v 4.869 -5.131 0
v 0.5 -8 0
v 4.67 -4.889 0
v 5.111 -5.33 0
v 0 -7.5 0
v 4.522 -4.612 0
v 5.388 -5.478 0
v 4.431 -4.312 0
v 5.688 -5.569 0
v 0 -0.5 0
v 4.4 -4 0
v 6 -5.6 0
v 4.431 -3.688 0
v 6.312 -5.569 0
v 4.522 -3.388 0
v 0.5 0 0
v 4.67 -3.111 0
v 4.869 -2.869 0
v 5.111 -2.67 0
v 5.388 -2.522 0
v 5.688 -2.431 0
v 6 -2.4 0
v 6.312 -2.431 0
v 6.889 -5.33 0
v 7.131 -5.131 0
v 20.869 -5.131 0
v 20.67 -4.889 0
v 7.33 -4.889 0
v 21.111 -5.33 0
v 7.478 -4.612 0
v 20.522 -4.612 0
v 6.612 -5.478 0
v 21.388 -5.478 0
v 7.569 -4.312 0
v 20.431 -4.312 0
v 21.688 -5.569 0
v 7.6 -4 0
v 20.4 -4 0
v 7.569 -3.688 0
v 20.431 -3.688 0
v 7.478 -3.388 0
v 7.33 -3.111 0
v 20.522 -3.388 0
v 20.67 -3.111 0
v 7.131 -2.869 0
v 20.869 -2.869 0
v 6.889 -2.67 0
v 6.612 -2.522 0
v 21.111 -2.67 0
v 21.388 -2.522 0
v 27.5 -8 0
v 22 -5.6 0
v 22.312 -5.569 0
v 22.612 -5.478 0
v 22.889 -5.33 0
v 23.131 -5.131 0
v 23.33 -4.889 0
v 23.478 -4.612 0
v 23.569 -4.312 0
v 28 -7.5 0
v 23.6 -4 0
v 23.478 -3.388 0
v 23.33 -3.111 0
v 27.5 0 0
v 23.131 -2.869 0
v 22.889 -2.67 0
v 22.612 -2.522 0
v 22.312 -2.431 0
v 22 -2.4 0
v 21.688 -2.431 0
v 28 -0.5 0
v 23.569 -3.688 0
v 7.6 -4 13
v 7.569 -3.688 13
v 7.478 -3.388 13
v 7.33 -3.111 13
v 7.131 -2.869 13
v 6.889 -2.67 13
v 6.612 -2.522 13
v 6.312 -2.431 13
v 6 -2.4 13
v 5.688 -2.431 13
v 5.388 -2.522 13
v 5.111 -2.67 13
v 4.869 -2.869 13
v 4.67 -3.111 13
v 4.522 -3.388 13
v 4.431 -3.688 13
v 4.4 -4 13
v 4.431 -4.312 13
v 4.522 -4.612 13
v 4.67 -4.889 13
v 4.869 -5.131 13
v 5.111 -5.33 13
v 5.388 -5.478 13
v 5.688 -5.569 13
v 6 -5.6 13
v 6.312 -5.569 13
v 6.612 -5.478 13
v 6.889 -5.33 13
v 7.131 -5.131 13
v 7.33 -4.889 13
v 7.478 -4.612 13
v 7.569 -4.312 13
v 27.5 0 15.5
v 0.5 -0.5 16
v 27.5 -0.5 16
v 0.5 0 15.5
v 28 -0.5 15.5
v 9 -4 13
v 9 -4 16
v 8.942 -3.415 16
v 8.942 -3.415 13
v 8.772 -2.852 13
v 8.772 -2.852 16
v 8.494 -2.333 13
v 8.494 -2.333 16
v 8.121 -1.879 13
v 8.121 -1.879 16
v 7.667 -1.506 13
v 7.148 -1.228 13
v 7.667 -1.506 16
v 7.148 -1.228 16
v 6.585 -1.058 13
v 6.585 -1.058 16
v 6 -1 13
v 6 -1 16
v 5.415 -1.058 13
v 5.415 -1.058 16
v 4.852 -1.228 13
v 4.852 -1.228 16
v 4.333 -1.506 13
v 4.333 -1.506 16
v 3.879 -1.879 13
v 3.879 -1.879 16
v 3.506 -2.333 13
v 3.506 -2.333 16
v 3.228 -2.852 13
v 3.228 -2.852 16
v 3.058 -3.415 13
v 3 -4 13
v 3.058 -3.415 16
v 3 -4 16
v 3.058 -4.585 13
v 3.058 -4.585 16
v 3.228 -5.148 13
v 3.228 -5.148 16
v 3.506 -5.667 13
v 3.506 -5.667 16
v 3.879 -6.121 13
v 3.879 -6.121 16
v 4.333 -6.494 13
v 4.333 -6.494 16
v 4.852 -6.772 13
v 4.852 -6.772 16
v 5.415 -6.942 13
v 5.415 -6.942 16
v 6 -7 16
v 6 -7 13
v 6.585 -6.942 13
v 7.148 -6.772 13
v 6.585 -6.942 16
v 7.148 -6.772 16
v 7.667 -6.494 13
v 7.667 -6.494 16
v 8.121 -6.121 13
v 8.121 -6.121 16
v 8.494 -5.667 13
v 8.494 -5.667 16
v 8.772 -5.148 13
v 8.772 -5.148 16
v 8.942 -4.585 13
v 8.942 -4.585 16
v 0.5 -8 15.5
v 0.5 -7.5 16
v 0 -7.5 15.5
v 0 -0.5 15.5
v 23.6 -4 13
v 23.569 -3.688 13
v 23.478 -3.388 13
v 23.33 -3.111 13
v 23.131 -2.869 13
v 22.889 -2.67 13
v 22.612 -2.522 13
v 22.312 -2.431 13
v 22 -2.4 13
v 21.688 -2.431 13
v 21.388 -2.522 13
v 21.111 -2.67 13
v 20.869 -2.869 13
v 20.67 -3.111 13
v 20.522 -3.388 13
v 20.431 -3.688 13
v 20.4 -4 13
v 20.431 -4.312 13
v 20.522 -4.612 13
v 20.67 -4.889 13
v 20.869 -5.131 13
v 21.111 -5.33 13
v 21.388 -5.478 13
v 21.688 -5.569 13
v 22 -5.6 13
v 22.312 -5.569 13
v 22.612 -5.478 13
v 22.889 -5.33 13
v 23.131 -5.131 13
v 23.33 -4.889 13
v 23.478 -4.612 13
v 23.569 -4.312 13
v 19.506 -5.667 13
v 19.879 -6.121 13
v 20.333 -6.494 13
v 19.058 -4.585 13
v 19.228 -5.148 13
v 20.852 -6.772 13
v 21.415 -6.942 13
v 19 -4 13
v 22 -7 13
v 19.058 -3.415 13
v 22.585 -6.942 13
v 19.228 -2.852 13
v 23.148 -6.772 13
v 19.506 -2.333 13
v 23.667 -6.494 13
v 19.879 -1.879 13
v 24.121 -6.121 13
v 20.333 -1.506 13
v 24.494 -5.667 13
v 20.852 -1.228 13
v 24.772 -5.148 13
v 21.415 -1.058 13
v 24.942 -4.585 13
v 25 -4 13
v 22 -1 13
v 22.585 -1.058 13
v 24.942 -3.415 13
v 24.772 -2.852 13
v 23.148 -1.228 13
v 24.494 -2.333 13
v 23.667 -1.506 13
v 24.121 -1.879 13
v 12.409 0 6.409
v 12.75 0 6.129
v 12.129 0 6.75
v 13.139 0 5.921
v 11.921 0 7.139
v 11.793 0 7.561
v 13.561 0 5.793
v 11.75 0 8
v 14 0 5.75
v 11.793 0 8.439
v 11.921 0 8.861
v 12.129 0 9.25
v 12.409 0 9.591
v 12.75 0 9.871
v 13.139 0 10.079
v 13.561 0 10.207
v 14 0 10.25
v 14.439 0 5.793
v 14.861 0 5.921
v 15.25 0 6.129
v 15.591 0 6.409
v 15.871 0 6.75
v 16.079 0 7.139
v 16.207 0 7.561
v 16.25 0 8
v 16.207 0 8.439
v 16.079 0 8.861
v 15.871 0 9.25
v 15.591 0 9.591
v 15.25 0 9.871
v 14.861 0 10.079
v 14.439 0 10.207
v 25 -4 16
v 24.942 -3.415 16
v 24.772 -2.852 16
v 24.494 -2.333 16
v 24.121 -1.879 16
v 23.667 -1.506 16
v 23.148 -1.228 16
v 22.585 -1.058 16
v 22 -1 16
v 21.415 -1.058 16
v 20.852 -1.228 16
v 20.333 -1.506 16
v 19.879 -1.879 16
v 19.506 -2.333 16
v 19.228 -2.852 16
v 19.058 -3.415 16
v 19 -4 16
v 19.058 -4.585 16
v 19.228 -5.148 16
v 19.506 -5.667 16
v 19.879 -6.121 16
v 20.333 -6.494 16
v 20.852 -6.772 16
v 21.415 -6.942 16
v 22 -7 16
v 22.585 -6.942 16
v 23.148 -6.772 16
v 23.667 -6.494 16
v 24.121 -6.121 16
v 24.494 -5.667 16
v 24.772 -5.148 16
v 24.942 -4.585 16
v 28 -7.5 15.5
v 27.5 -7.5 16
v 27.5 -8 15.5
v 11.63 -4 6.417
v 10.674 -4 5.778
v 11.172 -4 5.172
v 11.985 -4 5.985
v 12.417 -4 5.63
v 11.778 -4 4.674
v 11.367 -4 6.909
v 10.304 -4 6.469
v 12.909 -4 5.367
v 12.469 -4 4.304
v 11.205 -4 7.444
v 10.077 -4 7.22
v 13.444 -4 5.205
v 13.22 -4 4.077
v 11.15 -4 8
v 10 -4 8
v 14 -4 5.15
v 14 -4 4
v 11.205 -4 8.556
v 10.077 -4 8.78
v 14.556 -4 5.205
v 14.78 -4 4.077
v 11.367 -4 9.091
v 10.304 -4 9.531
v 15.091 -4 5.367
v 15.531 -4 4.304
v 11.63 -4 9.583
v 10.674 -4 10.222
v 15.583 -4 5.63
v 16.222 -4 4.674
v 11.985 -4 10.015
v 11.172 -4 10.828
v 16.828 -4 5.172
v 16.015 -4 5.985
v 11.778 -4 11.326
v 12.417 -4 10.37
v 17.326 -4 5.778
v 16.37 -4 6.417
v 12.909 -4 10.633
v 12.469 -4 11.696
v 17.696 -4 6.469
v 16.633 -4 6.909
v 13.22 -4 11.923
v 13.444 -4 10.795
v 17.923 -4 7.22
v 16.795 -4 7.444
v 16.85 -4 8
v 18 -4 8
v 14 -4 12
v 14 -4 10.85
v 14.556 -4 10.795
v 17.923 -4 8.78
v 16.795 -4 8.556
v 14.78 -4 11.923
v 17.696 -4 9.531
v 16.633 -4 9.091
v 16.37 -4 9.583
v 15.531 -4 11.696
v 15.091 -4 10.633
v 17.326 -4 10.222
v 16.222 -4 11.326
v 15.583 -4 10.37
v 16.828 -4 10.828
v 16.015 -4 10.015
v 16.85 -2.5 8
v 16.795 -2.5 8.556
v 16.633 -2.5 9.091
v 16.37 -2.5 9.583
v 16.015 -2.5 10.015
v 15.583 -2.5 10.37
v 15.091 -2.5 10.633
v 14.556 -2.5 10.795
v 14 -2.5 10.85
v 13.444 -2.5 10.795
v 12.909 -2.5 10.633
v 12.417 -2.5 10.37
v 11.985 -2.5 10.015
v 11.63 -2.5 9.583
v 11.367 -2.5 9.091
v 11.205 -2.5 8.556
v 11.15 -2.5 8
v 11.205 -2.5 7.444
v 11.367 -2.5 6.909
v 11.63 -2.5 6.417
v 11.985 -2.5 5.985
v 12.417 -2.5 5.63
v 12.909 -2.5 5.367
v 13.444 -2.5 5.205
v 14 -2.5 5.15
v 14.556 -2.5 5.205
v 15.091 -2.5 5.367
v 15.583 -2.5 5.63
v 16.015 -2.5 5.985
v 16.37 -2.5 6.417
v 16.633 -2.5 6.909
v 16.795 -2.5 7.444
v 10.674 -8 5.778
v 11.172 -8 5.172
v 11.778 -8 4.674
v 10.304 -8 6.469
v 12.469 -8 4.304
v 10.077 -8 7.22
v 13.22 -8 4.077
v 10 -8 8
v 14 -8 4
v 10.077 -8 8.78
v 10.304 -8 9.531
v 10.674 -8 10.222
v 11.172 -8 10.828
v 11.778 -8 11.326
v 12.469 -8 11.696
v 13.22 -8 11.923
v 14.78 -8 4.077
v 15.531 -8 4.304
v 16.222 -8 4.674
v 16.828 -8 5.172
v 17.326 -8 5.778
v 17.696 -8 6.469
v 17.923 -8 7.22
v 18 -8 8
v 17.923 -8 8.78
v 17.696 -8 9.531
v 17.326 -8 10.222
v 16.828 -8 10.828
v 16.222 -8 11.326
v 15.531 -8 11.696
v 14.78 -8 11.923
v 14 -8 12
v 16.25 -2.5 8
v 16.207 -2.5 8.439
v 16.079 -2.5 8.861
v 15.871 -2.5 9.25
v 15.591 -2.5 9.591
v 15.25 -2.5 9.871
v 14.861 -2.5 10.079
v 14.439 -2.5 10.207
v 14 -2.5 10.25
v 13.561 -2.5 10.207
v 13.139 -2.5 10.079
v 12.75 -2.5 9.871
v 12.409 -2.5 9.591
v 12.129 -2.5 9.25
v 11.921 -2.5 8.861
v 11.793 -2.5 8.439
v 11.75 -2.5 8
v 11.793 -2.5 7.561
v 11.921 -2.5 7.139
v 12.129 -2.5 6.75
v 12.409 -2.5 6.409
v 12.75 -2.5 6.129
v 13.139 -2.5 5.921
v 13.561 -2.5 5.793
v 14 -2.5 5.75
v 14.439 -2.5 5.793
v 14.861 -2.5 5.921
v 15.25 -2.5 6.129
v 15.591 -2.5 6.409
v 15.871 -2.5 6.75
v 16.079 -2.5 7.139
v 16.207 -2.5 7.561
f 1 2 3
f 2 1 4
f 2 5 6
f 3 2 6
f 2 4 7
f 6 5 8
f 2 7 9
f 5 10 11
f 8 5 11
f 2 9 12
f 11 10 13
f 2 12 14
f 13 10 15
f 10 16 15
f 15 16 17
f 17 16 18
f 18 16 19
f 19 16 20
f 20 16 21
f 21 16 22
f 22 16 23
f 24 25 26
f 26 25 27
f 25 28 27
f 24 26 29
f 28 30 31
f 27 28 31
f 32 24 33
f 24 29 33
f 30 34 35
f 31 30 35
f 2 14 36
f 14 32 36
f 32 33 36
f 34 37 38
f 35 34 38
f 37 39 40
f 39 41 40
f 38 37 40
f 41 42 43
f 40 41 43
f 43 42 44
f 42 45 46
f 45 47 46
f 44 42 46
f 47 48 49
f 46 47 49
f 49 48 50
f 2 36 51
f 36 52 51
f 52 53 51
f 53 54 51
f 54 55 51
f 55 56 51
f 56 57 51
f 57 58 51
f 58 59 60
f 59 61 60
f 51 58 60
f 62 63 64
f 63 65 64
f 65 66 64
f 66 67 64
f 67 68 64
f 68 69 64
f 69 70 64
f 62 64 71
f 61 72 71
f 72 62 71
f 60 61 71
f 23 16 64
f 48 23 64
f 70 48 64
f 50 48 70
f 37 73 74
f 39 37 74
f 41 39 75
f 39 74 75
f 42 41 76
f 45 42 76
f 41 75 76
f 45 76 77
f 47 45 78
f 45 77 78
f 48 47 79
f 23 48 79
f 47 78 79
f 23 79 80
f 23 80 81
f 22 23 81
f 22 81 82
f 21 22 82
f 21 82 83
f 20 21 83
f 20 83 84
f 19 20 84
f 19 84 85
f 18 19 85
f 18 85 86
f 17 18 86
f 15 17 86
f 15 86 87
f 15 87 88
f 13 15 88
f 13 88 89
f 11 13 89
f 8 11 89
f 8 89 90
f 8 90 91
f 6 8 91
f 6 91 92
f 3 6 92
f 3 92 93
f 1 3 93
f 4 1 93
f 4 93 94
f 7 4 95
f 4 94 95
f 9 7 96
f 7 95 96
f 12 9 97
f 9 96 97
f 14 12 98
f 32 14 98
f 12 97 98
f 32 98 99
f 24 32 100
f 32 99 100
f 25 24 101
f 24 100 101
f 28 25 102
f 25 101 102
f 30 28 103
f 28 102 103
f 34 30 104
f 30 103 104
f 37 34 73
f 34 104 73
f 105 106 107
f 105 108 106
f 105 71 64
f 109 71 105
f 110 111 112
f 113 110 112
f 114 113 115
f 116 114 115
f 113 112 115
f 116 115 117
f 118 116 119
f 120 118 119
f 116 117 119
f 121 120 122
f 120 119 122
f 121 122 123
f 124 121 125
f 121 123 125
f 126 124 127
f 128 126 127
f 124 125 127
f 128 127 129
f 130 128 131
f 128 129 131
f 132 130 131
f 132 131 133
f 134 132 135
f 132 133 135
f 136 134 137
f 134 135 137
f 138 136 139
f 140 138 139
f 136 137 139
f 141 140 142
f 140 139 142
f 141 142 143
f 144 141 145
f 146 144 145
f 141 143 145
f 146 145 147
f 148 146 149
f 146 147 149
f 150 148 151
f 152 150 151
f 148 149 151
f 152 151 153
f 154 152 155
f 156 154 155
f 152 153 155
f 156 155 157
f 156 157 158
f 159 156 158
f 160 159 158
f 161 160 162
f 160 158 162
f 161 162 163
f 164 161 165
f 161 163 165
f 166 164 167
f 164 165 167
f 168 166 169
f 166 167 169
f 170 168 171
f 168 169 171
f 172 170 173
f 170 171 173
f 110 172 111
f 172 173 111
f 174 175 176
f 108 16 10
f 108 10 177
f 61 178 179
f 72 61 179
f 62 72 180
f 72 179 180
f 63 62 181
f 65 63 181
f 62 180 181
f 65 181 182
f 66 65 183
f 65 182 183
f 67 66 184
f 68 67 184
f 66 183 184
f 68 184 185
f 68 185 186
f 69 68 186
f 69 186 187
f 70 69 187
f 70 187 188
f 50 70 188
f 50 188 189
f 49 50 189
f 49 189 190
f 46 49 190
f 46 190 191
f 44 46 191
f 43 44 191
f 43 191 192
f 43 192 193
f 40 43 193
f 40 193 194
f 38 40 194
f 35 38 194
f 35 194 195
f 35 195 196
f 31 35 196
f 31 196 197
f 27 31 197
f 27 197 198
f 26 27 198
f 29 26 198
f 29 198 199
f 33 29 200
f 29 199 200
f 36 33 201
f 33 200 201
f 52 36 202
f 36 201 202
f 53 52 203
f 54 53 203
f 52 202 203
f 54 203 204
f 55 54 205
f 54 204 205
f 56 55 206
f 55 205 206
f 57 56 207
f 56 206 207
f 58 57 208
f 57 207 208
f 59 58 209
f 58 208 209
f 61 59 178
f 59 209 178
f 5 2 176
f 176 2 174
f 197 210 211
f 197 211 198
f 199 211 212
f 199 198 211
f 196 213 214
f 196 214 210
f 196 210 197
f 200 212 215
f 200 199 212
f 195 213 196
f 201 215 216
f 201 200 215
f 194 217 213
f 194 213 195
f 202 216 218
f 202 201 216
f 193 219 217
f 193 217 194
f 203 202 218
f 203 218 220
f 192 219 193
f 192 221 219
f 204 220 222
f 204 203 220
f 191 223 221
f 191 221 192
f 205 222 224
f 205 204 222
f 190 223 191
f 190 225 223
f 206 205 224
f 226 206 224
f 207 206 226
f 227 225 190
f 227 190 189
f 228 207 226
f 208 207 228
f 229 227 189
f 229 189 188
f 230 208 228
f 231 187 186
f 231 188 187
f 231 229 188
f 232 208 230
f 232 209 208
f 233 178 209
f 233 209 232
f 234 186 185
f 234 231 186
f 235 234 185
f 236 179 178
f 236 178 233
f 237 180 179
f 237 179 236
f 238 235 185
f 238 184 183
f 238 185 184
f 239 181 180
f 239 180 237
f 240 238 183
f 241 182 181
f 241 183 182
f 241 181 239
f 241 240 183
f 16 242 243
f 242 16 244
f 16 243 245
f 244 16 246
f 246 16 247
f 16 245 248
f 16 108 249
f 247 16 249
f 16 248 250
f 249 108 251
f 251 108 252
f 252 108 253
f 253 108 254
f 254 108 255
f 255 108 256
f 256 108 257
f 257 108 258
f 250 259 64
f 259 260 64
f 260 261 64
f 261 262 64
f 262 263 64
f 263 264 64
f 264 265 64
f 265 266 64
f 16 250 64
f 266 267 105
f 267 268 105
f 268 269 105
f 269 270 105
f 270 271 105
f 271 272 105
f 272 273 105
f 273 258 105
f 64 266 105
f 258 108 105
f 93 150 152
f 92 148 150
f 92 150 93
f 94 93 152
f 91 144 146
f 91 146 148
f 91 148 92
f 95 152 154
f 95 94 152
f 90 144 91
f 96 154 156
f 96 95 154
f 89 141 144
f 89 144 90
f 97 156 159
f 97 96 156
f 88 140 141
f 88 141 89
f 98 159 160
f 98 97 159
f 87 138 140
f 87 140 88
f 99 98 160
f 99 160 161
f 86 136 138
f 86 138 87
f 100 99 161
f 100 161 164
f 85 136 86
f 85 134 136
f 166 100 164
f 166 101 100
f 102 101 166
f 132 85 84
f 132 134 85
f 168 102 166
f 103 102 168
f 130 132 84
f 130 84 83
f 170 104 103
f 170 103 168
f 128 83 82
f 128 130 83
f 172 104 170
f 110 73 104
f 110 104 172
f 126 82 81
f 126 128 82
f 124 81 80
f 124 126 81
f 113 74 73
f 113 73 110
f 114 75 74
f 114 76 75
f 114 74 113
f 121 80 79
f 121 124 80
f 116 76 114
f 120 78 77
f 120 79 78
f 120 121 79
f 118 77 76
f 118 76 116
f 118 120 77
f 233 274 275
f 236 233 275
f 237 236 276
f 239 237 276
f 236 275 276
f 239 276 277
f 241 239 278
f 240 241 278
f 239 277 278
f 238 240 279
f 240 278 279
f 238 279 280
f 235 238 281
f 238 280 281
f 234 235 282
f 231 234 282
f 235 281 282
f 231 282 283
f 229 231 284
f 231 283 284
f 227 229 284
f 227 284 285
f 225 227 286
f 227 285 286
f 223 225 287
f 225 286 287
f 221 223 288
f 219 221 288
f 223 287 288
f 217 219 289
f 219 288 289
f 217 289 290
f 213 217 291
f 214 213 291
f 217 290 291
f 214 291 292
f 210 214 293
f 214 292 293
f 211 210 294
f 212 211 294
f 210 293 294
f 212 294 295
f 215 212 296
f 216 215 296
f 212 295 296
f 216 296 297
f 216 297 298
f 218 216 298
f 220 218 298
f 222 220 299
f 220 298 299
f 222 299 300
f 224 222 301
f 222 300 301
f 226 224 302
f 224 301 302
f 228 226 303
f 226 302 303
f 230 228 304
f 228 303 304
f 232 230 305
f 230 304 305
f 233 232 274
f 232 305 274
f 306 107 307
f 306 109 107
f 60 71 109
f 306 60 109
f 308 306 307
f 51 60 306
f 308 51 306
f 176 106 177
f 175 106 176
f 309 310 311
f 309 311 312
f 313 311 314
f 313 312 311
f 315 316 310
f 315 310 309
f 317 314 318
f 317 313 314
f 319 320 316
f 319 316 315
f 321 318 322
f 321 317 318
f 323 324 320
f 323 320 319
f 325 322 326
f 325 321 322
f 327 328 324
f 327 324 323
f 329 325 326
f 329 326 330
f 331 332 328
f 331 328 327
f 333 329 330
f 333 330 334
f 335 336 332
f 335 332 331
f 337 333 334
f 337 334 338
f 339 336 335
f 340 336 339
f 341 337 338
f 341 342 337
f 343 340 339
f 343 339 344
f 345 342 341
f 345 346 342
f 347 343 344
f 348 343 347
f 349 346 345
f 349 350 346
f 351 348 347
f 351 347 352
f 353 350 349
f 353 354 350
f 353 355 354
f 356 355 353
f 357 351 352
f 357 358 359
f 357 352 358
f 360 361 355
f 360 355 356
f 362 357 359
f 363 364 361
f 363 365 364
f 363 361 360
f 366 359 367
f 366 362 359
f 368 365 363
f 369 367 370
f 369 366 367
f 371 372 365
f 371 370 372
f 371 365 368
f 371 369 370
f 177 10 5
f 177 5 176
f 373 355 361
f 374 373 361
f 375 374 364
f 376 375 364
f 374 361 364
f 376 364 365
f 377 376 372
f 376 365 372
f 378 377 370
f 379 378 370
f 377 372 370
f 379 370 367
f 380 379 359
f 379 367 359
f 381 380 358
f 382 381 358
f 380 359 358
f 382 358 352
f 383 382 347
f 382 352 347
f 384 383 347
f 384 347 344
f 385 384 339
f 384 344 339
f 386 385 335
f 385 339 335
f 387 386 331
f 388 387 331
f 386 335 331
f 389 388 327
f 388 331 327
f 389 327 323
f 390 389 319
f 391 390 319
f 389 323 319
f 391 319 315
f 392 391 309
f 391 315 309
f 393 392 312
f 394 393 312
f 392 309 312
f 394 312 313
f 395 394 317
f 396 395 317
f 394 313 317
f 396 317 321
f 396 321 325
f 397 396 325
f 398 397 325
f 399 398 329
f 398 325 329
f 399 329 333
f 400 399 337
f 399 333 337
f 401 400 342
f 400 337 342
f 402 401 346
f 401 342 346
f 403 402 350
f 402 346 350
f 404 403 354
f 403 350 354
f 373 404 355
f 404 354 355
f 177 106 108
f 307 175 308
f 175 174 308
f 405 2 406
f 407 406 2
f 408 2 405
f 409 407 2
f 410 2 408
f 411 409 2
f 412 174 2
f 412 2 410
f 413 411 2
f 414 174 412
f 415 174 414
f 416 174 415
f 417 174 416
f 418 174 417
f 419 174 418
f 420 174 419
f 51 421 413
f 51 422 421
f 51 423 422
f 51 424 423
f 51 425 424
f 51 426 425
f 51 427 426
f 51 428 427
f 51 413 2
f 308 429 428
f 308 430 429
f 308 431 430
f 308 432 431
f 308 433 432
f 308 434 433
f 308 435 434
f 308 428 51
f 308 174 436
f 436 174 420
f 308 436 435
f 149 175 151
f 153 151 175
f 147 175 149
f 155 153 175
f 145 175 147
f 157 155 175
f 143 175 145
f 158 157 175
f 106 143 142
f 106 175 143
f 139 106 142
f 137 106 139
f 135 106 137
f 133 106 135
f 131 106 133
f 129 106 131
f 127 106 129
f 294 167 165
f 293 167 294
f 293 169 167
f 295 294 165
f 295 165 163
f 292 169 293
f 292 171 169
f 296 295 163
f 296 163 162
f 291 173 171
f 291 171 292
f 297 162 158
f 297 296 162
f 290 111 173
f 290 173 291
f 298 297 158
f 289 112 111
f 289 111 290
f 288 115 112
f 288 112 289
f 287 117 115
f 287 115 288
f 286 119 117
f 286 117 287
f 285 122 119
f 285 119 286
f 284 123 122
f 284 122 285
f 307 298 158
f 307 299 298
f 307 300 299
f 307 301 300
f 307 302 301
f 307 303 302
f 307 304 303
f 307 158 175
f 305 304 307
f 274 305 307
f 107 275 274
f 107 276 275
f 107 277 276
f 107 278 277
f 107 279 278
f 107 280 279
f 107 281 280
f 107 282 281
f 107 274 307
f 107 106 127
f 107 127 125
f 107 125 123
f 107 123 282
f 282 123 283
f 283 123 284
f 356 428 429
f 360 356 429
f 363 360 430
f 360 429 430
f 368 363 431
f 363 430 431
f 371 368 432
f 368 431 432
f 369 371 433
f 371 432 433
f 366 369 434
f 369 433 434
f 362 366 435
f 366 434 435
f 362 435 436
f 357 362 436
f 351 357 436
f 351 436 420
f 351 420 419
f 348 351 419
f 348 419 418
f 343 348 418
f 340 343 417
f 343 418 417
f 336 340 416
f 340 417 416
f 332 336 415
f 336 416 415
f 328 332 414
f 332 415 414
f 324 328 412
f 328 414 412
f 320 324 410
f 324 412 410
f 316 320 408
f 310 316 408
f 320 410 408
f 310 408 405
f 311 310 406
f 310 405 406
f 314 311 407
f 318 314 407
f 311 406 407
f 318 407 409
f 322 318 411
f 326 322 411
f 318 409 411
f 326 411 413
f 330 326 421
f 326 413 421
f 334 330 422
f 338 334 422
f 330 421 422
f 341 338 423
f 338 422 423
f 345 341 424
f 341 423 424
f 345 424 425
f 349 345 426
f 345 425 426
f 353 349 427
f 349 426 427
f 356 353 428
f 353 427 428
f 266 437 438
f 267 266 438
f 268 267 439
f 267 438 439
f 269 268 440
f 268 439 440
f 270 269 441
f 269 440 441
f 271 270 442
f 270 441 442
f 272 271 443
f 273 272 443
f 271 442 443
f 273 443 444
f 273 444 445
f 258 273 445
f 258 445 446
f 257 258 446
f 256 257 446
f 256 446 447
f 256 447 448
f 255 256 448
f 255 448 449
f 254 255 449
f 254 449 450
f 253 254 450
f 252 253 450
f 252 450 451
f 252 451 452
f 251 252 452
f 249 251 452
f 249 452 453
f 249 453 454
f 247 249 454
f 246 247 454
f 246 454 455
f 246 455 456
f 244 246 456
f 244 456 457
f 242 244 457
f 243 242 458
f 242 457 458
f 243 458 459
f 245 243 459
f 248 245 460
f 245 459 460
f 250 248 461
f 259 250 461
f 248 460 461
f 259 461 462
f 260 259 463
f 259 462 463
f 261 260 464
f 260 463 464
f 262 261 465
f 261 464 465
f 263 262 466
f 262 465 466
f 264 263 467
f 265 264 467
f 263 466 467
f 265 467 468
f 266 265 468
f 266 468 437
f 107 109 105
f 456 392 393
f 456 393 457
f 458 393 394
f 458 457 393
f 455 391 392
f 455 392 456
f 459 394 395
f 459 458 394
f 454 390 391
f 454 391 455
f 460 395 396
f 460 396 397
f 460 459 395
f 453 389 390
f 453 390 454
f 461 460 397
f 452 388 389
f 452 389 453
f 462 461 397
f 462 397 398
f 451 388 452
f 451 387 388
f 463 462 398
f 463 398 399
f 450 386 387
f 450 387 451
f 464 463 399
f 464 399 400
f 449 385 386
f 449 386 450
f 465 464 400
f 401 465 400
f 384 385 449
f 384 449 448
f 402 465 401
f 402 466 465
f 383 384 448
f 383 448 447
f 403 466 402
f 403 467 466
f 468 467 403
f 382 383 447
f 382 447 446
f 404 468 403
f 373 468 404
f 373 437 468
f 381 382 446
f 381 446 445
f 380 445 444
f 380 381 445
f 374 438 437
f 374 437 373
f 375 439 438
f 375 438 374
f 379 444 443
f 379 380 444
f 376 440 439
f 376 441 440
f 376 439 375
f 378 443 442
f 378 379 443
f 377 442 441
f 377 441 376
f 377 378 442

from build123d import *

# Parameters (mm, degrees)
F0_W      = 28
F0_H      = 16
F1_DEPTH  = 8
F2_R      = 4
F3_DEPTH  = 4
F4_R      = 2.85
F5_DEPTH  = 1.5
F6_R      = 2.25
F7_DEPTH  = 25
F8_R      = 3
F10_DEPTH = 3
F9_R      = 3
F11_DEPTH = 3
F12_R     = 1.6
F14_DEPTH = 25
F13_R     = 1.6
F15_DEPTH = 25
F16_SIZE  = 0.5


with BuildPart() as f1:
    # F0 (on Front) → F1 (new body)
    with BuildSketch(Plane.XZ):
        with Locations((14, 8)):
            Rectangle(F0_W, F0_H)
    extrude(amount=F1_DEPTH)

    # F2 (on face) → F3 (cut)
    with BuildSketch(Plane.XZ.offset(8)):
        with Locations((14, 8)):
            Circle(F2_R)
    extrude(amount=-F3_DEPTH, mode=Mode.SUBTRACT)

    # F4 (on face) → F5 (cut)
    with BuildSketch(Plane.XZ.offset(4)):
        with Locations((14, 8)):
            Circle(F4_R)
    extrude(amount=-F5_DEPTH, mode=Mode.SUBTRACT)

    # F6 (on face) → F7 (cut)
    with BuildSketch(Plane.XZ.offset(2.5)):
        with Locations((14, 8)):
            Circle(F6_R)
    extrude(amount=-F7_DEPTH, mode=Mode.SUBTRACT)

    # F8 (on face) → F10 (cut)
    with BuildSketch(Plane.XY.offset(16)):
        with Locations((6, -4)):
            Circle(F8_R)
    extrude(amount=-F10_DEPTH, mode=Mode.SUBTRACT)

    # F9 (on face) → F11 (cut)
    with BuildSketch(Plane.XY.offset(16)):
        with Locations((22, -4)):
            Circle(F9_R)
    extrude(amount=-F11_DEPTH, mode=Mode.SUBTRACT)

    # F12 (on face) → F14 (cut)
    with BuildSketch(Plane.XY.offset(13)):
        with Locations((6, -4)):
            Circle(F12_R)
    extrude(amount=-F14_DEPTH, mode=Mode.SUBTRACT)

    # F13 (on face) → F15 (cut)
    with BuildSketch(Plane.XY.offset(13)):
        with Locations((22, -4)):
            Circle(F13_R)
    extrude(amount=-F15_DEPTH, mode=Mode.SUBTRACT)

    # F16
    f16_edges = [f1.edges().sort_by_distance(p)[0] for p in [
        (28, -8, 8),
        (28, -4, 16),
        (28, 0, 8),
        (14, -8, 16),
        (14, 0, 16),
        (0, -4, 16),
        (0, -8, 8),
        (0, 0, 8),
    ]]
    chamfer(f16_edges, length=F16_SIZE)


solid = f1.part
